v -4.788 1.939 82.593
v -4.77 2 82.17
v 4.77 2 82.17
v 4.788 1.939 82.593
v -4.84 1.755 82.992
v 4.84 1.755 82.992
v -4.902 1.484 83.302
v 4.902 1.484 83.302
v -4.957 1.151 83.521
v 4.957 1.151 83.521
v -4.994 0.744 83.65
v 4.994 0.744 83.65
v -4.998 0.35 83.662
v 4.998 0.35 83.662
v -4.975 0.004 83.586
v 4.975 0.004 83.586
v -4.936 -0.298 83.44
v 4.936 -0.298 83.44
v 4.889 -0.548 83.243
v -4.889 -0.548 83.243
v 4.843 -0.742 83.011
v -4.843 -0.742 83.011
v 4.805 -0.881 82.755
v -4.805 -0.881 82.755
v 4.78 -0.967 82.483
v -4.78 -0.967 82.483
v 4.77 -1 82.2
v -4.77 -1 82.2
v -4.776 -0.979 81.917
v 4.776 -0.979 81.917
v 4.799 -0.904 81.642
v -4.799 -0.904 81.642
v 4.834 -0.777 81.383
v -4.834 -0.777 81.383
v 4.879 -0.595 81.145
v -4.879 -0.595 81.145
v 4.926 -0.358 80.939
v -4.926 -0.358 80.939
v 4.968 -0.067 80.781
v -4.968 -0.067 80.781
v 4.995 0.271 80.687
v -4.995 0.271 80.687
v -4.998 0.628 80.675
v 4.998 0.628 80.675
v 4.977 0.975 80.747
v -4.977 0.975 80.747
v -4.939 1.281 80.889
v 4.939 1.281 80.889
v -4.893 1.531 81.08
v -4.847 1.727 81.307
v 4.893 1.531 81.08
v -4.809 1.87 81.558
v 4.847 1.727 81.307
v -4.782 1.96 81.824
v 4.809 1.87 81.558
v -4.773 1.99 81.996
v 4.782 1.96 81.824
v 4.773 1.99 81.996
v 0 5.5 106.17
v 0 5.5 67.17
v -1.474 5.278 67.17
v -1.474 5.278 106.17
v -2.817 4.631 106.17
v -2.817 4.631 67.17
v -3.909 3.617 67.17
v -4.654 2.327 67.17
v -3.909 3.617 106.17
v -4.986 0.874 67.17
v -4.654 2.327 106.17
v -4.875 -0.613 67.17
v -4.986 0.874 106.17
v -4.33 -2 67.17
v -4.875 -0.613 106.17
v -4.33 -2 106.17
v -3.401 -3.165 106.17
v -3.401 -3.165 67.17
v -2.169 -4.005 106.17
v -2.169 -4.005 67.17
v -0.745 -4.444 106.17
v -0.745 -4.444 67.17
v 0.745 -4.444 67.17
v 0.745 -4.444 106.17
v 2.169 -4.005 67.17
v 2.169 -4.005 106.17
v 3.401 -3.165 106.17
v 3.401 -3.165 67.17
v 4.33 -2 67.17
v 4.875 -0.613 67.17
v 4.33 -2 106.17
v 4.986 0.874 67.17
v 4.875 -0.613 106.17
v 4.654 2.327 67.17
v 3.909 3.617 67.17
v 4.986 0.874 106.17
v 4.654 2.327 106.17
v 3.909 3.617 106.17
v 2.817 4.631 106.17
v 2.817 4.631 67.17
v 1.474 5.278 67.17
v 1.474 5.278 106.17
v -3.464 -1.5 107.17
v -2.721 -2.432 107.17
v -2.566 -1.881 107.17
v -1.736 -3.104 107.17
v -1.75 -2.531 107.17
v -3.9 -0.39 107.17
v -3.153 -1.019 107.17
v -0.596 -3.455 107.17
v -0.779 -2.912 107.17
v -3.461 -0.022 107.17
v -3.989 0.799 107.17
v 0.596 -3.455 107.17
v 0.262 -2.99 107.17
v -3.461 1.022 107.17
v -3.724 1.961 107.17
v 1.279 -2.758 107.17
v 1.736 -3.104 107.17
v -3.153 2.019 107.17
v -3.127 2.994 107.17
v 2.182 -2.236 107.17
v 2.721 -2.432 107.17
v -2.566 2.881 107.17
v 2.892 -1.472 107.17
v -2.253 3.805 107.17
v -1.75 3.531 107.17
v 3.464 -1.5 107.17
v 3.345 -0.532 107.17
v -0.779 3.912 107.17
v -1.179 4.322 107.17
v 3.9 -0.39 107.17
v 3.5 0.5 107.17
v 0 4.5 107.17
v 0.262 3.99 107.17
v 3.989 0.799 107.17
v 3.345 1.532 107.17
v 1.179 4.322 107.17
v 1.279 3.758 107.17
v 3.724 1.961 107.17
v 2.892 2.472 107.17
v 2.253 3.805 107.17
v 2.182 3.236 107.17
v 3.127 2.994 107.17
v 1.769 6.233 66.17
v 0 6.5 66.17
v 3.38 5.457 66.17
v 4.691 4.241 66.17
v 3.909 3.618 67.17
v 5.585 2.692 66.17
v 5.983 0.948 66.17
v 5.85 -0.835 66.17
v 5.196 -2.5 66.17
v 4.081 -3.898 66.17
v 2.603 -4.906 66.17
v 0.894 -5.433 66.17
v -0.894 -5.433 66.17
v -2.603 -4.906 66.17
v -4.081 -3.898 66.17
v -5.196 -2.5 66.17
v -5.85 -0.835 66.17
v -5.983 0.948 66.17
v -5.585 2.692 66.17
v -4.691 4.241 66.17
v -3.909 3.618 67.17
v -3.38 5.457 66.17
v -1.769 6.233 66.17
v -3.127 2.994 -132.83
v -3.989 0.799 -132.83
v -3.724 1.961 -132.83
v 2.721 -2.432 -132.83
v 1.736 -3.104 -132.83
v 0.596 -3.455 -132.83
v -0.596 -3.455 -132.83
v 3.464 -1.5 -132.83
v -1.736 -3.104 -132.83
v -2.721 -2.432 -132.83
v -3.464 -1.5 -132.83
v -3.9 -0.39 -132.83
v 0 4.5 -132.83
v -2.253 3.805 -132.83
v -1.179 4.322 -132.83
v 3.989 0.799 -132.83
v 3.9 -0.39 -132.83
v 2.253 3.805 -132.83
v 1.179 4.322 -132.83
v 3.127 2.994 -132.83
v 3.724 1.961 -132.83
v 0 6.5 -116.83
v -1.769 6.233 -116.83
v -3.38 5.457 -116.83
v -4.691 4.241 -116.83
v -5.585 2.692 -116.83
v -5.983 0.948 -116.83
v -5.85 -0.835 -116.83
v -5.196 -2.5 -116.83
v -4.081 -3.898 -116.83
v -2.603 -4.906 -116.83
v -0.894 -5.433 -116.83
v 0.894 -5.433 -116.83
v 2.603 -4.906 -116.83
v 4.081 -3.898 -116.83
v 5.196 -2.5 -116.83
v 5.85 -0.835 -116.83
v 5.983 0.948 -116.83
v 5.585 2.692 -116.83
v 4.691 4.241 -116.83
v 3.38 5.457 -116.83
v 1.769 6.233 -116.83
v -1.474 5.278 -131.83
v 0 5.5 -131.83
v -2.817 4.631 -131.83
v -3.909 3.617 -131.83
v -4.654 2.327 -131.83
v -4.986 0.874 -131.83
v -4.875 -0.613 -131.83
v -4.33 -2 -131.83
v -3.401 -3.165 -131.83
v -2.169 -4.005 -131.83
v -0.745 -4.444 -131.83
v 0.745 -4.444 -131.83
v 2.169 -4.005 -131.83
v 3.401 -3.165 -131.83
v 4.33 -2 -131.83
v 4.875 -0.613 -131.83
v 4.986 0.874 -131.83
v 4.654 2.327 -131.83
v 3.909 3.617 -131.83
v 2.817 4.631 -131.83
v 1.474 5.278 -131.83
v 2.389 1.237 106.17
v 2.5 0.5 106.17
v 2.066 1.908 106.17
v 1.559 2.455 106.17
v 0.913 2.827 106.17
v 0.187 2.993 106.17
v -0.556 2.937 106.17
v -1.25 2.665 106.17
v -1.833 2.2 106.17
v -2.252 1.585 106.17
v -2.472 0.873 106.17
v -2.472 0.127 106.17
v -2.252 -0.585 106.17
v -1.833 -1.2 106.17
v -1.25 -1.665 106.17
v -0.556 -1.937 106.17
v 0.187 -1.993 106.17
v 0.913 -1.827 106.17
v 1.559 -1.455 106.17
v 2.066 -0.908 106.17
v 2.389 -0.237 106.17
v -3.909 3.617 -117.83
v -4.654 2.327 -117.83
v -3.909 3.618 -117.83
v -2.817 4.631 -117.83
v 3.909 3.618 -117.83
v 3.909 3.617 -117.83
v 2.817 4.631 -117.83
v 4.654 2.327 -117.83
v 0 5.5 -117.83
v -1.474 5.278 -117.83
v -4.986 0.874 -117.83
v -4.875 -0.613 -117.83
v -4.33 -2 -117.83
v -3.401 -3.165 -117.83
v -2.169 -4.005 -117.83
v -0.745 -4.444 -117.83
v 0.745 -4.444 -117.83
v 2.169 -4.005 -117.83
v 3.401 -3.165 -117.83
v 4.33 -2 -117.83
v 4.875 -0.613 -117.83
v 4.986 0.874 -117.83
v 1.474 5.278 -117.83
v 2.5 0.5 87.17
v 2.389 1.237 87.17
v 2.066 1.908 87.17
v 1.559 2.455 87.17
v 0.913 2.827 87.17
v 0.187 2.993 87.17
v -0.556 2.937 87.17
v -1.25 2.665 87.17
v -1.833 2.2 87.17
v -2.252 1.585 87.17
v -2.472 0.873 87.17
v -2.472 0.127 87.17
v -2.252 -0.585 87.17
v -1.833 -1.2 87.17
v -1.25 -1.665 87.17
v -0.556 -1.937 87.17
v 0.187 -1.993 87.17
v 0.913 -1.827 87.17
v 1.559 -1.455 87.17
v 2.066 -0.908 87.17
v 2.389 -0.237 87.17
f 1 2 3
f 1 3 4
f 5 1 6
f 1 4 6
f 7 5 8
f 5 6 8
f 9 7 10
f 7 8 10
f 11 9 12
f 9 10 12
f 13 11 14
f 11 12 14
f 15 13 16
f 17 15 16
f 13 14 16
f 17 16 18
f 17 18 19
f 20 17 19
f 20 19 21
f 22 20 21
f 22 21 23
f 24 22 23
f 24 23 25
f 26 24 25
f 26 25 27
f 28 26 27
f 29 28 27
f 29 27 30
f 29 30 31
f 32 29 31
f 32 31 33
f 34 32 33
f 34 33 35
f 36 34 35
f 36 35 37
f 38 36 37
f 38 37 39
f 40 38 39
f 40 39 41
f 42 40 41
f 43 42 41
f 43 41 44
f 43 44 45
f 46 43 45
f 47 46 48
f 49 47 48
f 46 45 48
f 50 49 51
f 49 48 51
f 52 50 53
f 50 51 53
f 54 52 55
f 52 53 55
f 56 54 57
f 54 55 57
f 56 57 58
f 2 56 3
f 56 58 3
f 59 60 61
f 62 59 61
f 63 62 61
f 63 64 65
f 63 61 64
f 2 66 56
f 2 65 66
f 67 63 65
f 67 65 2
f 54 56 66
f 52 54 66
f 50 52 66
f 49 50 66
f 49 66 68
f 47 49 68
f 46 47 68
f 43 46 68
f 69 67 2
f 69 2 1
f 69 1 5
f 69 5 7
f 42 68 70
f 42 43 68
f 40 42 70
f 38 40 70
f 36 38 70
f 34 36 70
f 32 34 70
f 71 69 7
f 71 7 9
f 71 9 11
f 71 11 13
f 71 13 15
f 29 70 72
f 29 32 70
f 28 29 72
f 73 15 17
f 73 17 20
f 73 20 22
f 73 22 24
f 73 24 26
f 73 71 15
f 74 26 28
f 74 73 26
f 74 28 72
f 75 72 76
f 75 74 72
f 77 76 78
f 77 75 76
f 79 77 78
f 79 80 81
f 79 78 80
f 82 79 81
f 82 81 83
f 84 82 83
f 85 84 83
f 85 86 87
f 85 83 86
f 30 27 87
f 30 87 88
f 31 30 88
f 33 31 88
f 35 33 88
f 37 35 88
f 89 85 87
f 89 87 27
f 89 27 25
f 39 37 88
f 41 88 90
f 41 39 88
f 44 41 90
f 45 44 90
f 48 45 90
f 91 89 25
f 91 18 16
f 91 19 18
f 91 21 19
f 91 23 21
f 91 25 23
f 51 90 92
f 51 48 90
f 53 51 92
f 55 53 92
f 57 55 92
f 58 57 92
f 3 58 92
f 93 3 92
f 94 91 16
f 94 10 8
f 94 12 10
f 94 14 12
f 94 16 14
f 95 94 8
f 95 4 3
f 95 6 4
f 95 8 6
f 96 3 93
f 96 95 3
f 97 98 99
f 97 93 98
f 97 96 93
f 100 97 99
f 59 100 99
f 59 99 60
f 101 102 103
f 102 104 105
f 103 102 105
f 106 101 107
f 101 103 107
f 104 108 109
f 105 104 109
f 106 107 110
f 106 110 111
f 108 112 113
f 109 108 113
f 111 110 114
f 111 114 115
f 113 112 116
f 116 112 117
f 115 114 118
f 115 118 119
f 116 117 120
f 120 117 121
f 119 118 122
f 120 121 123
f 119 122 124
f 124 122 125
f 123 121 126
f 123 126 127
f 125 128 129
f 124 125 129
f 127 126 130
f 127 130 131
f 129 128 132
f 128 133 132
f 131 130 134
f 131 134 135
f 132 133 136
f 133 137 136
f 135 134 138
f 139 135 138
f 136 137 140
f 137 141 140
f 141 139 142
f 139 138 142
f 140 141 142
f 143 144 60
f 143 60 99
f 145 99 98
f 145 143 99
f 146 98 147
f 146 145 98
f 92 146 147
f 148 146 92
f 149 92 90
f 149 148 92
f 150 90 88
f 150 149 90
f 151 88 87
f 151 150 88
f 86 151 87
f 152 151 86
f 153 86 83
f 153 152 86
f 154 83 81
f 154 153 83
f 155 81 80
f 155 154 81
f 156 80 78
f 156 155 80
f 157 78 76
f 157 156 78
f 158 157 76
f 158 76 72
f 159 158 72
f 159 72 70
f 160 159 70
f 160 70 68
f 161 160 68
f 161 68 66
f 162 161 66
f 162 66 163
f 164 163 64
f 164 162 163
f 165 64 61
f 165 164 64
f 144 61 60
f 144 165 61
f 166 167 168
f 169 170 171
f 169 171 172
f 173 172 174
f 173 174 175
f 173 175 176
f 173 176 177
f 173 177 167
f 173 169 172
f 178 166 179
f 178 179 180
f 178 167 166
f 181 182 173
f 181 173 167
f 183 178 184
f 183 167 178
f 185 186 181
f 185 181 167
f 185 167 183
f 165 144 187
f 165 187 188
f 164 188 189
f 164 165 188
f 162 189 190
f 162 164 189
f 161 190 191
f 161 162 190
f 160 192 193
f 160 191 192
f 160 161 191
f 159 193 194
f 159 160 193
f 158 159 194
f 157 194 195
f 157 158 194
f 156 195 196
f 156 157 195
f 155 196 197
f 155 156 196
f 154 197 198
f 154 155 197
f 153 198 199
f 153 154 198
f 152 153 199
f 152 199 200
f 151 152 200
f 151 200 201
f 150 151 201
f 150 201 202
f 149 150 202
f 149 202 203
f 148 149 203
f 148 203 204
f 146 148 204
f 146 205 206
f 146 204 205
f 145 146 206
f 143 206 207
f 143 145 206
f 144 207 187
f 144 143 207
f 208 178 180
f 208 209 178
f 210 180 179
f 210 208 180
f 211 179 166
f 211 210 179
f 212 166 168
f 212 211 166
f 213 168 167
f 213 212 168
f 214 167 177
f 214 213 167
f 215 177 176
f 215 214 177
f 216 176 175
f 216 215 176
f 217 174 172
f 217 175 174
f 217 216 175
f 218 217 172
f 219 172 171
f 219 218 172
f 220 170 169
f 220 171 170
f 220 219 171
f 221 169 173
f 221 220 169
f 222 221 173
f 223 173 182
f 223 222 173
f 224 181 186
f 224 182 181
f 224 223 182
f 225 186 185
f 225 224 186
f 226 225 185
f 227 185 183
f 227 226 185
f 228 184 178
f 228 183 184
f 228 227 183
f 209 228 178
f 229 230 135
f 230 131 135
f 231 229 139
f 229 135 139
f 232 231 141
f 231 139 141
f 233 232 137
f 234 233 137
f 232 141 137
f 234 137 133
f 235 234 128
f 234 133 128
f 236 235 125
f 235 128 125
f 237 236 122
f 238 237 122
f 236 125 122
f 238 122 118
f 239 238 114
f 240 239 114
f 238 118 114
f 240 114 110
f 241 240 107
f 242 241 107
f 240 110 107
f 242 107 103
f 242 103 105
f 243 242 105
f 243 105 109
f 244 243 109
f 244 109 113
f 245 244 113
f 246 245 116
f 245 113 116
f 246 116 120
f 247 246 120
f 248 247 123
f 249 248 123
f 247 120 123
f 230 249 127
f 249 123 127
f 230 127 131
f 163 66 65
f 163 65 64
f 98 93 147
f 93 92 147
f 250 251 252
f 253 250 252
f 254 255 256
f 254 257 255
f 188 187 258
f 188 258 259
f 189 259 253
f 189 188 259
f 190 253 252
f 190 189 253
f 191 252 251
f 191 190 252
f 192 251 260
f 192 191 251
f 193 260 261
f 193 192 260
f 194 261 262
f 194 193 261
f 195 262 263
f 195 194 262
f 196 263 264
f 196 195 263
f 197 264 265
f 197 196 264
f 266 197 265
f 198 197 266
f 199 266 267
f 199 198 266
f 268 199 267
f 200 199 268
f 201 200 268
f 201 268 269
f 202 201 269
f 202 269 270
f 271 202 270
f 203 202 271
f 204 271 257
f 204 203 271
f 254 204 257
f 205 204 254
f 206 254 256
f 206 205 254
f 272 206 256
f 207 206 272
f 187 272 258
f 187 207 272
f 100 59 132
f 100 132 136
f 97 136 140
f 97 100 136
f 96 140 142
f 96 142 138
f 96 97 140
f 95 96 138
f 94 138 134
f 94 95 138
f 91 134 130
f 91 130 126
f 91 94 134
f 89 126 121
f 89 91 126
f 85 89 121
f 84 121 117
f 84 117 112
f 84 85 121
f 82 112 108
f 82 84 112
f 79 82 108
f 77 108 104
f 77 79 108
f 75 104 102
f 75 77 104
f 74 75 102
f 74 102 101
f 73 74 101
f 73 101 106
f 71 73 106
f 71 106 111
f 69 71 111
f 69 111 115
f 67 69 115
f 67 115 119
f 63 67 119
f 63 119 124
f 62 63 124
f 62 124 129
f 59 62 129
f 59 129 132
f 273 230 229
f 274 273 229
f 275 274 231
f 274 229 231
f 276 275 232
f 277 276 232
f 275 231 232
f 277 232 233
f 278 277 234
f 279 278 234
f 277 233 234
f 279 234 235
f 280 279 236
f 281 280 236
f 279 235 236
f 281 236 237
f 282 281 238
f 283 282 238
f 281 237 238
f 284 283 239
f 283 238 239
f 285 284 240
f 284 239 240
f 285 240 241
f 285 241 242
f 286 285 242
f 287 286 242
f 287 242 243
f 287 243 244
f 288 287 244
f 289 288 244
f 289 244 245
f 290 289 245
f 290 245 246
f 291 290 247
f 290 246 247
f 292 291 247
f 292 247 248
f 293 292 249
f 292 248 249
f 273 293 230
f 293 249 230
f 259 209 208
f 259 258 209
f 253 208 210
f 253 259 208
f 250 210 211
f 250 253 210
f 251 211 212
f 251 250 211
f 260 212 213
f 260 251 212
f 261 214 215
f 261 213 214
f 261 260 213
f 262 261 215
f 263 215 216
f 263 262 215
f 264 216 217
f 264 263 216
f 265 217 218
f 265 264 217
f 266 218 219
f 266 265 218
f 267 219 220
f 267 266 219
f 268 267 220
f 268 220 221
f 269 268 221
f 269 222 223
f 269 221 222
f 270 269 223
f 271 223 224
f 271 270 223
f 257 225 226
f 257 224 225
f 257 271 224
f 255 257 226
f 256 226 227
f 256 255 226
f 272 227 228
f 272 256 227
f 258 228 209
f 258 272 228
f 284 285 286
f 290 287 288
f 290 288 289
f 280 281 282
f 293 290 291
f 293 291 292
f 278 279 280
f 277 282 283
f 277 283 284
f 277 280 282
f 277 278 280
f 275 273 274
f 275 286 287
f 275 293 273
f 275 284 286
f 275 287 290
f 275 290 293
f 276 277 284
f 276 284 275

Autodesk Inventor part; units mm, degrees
ref_plane "YZ Plane" through (0, 0, 0) normal (1, 0, 0) x (0, 1, 0)
ref_plane "XZ Plane" through (0, 0, 0) normal (0, 1, 0) x (-1, 0, 0)
ref_plane "XY Plane" through (0, 0, 0) normal (0, 0, 1) x (1, 0, 0)
sketch "Sketch1" plane through (0, 0, 0) normal (1, 0, 0) x (0, 1, 0)
  line L0 (0.5, 107.169868) -> (0.5, -132.830132)
  line L1 (0.5, -132.830132) -> (5.5, -132.830132)
  line L2 (5.5, -132.830132) -> (5.5, -117.830132)
  line L3 (5.5, -117.830132) -> (6.5, -117.830132)
  line L4 (6.5, -117.830132) -> (6.5, -42.830132)
  line L5 (6.5, -42.830132) -> (6.5, -42.830132)
  line L6 (6.5, -42.830132) -> (6.5, 7.169868)
  line L7 (6.5, 7.169868) -> (6.5, 7.169868)
  line L8 (6.5, 7.169868) -> (6.5, 67.169868)
  line L9 (6.5, 67.169868) -> (5.5, 67.169868)
  line L10 (5.5, 67.169868) -> (5.5, 107.169868)
  line L11 (5.5, 107.169868) -> (0.5, 107.169868)
  circle A0 centre (0.5, 82.169868) radius 1.5
  point P0 (0, 0)
  dimension "d2" = 5
  dimension "d3" = 5
  dimension "d4" = 6
  dimension "d5" = 6
  dimension "d6" = 6
  dimension "d7" = 40
  dimension "d8" = 50
  dimension "d9" = 60
  dimension "d10" = 75
  dimension "d11" = 15
  dimension "d28" = 3
  dimension "d43" = 15
sketch "Sketch1 outline for Revolution2" plane through (0, 0, 0) normal (1, 0, 0) x (0, 1, 0)
  line L0 (5.5, 107.169868) -> (0.5, 107.169868)
  line L1 (5.5, 67.169868) -> (5.5, 107.169868)
  line L2 (6.5, 67.169868) -> (5.5, 67.169868)
  line L3 (6.5, 7.169868) -> (6.5, 67.169868)
  line L4 (6.5, -42.830132) -> (6.5, 7.169868)
  line L5 (6.5, -117.830132) -> (6.5, -42.830132)
  line L6 (5.5, -117.830132) -> (6.5, -117.830132)
  line L7 (5.5, -132.830132) -> (5.5, -117.830132)
  line L8 (0.5, -132.830132) -> (5.5, -132.830132)
  line L9 (0.5, 107.169868) -> (0.5, -132.830132)
revolve "Revolution2" add sketch "Sketch1 outline for Revolution2" angle 360 about axis through (0, 0.5, 107.169868) along (0, 0, -1)
chamfer "Chamfer1" distance 1 angle 45 6 edges at (0, -4.5, 107.1699) (0, -5.5, 67.1699) (0, -5.5, 7.1699) (0, -5.5, -42.8301) (0, -5.5, -117.8301) (0, -4.5, -132.8301)
thread "Thread2" size "M12x1.5" class "6g" standard "ANSI Metric M Profile" length 20
thread "Thread3" size "M10x1" class "6g" standard "ANSI Metric M Profile" full length
sketch "Sketch1 outline for Extrusion2" plane through (0, 0, 0) normal (1, 0, 0) x (0, 1, 0)
  circle A0 centre (0.5, 82.169868) radius 1.5
extrude "Extrusion2" cut sketch "Sketch1 outline for Extrusion2" along normal through all both and the other way through all
thread "Thread4" size "M10x1.5" class "6g" standard "ANSI Metric M Profile" length 25
sketch "Sketch2" plane through (0, 0.5, 107.169868) normal (0, 0, 1) x (1, 0, 0)
  circle A0 centre (0, 0) radius 4 projected
  circle A1 centre (0, 0) radius 2.5
  point P0 (0, -0.5)
  dimension "d35" = 5
sketch "Sketch2 outline for Extrusion3" plane through (0, 0.5, 107.169868) normal (0, 0, 1) x (1, 0, 0)
  circle A0 centre (0, 0) radius 2.5
extrude "Extrusion3" cut sketch "Sketch2 outline for Extrusion3" against normal blind 20
chamfer "Chamfer2" distance 1 angle 45 1 edges at (-2.5, 0.5, 107.1699)
thread "Thread5" size "M5x0.8" class "6H" standard "ANSI Metric M Profile" full length
equation "\"d6\" = d5"
equation "\"d10\" = NagyKerékSzélesege"
equation "\"ZártSzelvényFalVastagság\" = 1.5"
equation "\"ZártSzelvényBelsőÁtmérő\" = 12"
equation "\"ZártSzelvényKülsőÁtmérő\" = 15"
equation "\"CsapágyBelsőÁtmérő\" = 12"
equation "\"CsapágySzélesége\" = 8"
equation "\"CsapágyKülsőÁtmérő\" = 28"
equation "\"CsapágyHázBelsőÁtmérő\" = 26"
equation "\"CsapágyHázHoszza\" = 45"
equation "\"CsapágyHázKülsőÁtmérő\" = 32"
equation "\"NagyKerékSzélesege\" = 75"
properties part number "NagyTengely"
